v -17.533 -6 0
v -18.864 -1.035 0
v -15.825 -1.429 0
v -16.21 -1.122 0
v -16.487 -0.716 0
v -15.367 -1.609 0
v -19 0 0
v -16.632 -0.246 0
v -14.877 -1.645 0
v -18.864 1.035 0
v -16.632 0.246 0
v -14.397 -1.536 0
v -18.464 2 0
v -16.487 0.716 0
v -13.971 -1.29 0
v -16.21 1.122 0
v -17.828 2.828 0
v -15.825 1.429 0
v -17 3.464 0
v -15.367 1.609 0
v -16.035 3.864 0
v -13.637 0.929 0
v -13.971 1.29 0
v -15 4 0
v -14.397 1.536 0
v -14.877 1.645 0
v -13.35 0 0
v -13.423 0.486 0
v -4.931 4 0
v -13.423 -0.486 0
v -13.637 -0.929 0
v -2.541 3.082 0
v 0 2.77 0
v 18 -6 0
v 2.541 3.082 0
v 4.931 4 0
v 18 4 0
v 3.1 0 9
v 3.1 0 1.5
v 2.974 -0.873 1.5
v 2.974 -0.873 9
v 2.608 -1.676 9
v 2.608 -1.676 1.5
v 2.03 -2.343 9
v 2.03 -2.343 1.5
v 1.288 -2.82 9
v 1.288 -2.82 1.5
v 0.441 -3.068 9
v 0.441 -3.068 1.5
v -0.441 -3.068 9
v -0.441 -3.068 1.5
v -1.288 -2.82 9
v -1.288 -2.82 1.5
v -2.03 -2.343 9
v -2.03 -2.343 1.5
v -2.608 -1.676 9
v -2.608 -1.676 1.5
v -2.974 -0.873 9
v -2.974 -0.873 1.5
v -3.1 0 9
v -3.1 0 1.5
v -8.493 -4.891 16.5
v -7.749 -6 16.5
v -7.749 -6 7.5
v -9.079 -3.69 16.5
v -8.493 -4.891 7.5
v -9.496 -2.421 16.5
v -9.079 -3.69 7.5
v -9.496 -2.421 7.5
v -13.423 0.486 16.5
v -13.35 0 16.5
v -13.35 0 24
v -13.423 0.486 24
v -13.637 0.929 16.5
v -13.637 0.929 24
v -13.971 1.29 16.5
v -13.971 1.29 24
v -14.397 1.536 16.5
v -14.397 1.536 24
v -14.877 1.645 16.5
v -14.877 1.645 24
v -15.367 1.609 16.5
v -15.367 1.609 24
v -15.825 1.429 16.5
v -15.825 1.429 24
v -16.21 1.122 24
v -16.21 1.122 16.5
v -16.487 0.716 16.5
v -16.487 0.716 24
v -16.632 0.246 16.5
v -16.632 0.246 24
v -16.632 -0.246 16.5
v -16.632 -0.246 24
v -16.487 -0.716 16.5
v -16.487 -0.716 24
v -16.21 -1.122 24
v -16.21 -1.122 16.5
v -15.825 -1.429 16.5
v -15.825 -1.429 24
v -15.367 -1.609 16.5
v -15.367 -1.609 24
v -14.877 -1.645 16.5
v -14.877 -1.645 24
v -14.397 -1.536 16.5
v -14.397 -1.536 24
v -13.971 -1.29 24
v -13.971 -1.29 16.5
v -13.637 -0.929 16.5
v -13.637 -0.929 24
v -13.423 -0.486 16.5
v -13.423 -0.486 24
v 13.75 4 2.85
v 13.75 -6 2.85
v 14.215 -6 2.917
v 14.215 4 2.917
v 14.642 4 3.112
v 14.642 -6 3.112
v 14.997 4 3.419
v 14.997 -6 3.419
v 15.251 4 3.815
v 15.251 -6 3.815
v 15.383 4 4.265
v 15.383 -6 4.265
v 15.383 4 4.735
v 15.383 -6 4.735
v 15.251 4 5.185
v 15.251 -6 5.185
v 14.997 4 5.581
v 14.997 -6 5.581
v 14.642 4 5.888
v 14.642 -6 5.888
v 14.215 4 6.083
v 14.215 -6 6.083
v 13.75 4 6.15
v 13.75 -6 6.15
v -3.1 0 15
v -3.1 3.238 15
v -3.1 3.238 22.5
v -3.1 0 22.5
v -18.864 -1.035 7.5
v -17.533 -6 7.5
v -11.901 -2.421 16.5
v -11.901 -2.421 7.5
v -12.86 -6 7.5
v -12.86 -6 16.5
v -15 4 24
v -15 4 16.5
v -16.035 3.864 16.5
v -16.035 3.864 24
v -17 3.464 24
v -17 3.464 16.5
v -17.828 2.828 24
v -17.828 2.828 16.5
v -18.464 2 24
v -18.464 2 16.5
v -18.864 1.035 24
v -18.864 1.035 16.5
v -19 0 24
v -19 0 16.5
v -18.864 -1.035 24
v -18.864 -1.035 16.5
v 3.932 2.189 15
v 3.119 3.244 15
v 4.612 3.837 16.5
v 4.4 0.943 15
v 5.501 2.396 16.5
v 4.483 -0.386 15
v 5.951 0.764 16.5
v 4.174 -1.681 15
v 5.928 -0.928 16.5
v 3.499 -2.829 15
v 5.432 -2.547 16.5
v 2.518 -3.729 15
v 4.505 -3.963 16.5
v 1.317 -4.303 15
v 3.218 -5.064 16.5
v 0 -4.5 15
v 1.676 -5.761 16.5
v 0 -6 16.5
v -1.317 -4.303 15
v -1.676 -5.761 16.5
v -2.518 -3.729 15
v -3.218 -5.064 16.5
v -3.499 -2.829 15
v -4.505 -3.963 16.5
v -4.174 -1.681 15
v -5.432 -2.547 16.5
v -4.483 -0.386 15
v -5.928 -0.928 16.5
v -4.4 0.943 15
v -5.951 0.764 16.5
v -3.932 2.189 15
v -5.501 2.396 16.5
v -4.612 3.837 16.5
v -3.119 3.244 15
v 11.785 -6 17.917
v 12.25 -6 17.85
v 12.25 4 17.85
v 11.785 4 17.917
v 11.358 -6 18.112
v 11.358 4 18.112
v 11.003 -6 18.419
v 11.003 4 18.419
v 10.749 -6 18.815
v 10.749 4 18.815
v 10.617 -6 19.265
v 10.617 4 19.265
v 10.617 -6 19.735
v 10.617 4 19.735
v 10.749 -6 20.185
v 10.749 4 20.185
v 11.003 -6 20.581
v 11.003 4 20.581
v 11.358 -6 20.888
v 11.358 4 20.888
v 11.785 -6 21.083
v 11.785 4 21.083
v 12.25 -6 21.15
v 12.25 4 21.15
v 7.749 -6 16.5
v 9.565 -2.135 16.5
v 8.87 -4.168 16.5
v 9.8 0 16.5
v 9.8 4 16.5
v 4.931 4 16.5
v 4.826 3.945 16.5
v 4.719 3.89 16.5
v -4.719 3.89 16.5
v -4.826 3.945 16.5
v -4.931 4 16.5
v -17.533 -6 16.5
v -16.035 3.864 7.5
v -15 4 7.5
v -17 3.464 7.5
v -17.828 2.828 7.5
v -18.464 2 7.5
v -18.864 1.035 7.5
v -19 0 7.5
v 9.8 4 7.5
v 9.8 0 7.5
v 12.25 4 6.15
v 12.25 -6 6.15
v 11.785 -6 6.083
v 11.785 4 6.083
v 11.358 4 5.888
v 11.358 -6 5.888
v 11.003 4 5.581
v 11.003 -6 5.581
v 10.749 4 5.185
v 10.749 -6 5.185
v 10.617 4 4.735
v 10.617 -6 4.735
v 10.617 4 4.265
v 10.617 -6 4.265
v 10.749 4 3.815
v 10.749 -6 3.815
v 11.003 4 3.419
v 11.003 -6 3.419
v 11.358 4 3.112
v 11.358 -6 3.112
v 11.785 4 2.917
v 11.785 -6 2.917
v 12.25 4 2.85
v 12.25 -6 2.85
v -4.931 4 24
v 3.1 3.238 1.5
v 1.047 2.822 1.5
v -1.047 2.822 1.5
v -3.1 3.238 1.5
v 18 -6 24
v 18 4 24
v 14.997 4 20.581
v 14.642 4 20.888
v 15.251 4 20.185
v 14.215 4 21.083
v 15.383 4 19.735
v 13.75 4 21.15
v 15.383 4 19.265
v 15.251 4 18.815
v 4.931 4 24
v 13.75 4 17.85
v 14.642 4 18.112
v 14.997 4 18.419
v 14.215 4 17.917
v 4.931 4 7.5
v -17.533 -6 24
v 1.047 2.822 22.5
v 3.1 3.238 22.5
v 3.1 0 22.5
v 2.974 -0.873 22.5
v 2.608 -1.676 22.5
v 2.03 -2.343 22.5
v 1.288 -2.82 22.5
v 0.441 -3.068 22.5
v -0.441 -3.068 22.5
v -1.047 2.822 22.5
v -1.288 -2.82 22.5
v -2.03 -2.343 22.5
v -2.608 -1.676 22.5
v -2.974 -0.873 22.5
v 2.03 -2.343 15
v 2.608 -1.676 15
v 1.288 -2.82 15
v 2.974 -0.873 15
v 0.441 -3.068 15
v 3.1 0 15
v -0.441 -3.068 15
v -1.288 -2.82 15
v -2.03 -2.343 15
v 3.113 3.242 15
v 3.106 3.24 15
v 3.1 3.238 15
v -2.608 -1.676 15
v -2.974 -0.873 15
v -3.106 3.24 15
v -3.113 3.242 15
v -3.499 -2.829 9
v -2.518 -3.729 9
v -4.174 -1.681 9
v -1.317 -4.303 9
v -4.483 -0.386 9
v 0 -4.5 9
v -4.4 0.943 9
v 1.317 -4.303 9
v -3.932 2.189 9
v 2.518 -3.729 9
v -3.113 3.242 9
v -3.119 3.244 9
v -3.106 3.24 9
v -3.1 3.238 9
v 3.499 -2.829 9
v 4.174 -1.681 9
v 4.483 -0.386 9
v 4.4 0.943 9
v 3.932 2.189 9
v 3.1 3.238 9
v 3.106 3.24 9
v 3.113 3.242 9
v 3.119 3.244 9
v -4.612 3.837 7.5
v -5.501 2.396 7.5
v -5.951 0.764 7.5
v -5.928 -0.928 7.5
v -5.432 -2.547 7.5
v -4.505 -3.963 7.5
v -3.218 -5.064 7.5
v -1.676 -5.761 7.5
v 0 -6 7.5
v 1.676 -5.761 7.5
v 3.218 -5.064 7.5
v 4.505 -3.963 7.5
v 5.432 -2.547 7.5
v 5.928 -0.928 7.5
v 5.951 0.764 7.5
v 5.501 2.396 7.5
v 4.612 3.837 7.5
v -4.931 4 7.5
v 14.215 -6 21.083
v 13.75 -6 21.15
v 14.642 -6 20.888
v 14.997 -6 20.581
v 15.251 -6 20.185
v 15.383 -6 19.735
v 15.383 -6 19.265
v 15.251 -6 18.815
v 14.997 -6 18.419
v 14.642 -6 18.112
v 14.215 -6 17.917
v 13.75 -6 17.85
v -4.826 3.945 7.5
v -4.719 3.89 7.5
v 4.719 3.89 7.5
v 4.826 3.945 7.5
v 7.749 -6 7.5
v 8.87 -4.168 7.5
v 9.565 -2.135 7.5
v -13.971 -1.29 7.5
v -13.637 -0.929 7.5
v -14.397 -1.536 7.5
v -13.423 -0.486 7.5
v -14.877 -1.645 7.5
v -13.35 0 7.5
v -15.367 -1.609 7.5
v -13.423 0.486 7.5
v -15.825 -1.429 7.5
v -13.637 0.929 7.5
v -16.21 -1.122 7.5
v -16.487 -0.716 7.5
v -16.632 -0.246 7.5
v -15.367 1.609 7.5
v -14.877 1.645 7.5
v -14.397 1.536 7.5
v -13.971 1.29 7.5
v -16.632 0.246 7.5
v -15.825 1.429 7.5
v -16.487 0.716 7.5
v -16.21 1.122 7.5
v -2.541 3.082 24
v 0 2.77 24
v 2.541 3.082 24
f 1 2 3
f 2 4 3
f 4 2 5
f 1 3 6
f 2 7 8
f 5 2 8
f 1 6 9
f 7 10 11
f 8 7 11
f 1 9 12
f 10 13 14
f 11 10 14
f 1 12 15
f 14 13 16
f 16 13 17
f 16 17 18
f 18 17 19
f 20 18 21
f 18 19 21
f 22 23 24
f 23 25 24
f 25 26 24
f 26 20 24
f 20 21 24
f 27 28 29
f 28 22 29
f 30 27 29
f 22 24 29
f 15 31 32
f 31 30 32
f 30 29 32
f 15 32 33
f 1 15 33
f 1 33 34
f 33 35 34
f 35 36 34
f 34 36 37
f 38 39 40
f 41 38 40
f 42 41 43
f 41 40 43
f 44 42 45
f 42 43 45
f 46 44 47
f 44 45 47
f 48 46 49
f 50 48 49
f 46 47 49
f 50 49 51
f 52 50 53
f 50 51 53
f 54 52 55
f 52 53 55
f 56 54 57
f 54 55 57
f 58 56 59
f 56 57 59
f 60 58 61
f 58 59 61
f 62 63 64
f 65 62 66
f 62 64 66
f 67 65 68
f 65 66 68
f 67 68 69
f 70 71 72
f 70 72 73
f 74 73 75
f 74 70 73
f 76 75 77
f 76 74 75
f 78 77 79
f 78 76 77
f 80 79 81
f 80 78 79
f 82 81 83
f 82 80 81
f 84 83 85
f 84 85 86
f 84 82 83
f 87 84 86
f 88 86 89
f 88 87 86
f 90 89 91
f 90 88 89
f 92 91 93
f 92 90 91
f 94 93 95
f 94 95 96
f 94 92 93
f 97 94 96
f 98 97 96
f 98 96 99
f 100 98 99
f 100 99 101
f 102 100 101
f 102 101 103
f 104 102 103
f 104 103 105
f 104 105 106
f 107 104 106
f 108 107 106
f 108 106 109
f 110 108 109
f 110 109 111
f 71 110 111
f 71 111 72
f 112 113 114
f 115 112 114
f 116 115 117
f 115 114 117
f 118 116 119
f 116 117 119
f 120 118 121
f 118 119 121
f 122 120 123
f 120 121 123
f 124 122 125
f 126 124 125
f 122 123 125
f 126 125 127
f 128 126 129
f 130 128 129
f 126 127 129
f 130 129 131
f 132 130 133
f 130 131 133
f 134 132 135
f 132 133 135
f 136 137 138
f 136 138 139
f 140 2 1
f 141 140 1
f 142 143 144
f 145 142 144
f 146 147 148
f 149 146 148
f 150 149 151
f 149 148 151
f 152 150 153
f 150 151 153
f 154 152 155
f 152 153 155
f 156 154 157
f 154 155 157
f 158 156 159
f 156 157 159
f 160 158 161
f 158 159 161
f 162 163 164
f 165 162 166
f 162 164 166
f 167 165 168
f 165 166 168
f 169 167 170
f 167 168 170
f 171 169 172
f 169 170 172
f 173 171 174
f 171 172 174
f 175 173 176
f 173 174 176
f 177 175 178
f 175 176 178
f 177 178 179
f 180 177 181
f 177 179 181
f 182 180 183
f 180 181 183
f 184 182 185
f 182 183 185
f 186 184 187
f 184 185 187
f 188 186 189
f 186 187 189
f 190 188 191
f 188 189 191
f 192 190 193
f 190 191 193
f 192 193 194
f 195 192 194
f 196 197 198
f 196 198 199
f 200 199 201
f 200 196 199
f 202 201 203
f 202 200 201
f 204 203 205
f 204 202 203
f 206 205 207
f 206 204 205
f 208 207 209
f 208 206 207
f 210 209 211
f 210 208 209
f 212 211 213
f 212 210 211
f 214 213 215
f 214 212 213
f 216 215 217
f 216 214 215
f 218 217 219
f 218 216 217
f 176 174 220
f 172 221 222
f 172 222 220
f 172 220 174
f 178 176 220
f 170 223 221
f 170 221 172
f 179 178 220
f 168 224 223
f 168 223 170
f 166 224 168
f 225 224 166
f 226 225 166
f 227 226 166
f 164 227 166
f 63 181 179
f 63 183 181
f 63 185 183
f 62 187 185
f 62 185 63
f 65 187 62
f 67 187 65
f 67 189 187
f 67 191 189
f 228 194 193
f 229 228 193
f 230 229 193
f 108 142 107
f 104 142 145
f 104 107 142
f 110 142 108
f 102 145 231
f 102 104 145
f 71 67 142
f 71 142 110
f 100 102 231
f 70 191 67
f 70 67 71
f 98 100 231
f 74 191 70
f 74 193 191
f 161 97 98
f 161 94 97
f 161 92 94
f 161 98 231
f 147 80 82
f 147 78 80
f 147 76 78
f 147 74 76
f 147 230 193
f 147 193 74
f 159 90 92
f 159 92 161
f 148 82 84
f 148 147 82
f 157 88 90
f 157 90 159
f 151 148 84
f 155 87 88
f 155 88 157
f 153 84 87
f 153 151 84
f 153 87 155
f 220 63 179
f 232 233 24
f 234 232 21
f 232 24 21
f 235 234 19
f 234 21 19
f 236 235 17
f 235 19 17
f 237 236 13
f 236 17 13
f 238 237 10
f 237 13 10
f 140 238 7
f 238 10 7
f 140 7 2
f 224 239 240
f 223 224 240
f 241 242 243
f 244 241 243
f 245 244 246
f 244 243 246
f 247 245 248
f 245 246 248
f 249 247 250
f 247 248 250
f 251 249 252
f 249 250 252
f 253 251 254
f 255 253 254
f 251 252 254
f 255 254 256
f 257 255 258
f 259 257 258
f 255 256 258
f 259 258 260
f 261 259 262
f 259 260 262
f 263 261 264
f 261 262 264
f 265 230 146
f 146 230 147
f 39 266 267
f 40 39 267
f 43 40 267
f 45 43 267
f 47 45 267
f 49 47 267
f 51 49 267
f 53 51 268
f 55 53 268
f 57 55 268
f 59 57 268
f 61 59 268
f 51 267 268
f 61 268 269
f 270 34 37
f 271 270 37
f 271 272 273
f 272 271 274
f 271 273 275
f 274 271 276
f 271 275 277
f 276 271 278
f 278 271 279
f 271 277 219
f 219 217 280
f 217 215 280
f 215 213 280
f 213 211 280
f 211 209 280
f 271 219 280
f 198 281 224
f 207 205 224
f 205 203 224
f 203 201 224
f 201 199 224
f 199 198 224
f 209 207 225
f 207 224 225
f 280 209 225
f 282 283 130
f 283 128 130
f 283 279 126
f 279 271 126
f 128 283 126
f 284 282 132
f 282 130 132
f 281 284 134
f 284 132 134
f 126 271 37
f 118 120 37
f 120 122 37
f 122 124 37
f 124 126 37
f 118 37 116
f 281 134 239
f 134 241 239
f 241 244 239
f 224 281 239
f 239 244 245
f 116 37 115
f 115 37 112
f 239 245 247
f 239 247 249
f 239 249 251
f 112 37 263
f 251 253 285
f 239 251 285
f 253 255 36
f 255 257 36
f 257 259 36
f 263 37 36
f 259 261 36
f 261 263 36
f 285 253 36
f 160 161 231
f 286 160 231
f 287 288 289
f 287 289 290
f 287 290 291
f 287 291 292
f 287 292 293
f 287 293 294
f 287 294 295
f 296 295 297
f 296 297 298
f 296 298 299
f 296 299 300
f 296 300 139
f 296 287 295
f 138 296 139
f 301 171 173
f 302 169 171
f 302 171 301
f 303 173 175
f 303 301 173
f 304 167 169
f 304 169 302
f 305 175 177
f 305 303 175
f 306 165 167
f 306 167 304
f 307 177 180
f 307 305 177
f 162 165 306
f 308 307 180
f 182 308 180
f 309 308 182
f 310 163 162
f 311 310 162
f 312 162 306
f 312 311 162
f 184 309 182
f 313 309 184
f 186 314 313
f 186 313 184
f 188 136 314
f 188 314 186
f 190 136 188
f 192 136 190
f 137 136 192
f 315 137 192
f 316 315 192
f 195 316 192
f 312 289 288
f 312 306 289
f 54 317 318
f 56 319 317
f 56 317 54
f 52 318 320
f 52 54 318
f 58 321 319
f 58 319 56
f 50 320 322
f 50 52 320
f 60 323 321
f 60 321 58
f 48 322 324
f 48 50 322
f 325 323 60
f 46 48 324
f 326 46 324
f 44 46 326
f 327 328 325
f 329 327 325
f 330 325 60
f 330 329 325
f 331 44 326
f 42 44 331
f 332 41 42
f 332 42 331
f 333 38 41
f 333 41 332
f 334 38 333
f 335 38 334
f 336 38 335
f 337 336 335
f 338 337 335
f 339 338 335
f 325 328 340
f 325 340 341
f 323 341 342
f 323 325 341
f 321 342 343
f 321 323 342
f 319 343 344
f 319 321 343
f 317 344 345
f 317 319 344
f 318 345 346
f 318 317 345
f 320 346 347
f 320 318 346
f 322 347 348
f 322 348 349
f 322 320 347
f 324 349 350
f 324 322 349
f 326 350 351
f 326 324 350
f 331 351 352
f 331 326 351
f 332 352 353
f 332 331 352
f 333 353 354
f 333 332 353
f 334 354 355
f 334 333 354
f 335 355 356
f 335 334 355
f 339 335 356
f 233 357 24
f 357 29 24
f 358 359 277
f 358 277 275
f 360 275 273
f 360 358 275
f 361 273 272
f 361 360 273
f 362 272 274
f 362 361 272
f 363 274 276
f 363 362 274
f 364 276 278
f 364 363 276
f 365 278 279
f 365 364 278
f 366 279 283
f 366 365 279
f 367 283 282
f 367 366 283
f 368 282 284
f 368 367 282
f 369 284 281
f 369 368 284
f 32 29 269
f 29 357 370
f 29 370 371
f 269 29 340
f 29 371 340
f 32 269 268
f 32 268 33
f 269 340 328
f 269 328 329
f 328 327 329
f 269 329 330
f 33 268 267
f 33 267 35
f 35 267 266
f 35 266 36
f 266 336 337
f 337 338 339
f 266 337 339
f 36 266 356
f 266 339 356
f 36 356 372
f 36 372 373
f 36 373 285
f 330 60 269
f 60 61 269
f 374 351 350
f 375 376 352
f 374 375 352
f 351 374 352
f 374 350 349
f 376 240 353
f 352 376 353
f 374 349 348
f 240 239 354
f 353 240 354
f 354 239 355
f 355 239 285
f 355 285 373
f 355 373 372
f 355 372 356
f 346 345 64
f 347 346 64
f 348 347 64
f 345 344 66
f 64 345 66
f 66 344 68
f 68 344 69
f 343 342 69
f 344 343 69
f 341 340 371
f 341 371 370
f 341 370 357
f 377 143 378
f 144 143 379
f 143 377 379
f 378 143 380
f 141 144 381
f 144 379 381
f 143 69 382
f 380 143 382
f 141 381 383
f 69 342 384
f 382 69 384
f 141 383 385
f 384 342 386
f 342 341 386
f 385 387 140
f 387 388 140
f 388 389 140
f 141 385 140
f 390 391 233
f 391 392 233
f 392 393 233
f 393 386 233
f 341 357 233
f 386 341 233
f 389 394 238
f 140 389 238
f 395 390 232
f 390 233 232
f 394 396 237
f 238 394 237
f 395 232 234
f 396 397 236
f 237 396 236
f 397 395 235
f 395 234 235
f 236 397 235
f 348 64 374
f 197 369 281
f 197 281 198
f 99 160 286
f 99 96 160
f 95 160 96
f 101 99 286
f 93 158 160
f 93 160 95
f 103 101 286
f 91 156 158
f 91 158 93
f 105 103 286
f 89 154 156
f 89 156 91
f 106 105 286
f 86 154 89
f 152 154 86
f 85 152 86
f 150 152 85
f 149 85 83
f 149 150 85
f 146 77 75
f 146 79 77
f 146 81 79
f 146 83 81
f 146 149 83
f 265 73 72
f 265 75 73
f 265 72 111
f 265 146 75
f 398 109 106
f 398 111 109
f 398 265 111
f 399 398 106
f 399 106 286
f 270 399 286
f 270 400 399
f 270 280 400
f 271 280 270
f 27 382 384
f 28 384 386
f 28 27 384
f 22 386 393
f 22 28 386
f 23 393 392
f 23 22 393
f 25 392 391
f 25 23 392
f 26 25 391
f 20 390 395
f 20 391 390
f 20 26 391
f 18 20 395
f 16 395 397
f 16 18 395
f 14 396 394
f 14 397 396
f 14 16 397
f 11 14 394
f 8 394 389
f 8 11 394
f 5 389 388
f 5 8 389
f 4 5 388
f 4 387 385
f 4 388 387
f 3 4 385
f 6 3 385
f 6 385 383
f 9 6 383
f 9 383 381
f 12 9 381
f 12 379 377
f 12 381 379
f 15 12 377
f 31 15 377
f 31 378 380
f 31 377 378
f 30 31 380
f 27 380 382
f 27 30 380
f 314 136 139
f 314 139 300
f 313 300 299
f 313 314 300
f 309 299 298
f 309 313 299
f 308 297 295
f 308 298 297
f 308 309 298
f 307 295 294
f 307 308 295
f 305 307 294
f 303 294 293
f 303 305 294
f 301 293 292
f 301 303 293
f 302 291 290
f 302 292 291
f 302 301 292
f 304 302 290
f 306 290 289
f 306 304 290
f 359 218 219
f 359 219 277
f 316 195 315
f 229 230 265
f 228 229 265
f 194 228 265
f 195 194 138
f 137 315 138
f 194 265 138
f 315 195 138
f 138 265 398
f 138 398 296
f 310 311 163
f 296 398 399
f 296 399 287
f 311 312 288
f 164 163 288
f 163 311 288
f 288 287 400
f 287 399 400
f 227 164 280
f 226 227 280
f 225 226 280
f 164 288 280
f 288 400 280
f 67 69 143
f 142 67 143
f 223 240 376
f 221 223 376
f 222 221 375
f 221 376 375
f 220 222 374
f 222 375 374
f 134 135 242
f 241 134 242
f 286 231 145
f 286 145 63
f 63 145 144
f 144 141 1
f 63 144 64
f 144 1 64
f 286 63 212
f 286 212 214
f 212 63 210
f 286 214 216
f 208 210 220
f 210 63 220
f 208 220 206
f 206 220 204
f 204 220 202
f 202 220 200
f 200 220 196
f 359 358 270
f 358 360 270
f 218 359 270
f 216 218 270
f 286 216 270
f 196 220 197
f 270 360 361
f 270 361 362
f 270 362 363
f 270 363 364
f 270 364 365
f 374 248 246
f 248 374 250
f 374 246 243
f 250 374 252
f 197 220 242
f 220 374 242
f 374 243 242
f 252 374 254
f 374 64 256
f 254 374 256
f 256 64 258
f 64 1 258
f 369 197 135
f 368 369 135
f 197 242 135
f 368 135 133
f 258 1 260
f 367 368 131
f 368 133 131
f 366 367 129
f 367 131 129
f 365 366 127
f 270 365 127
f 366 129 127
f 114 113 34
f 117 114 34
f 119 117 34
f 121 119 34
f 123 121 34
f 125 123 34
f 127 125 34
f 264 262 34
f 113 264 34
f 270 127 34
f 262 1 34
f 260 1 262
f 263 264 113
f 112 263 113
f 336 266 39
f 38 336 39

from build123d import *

# Parameters (mm, degrees)
SKETCH1_R               = 1.65
BOSS_EXTRUDE1_DEPTH     = 24
CUT_EXTRUDE1_DEPTH      = 4.5
CUT_EXTRUDE1_DEPTH_BACK = 4.5
CUT_EXTRUDE3_DEPTH      = 10.5
CUT_EXTRUDE3_DEPTH_BACK = 10.5
CUT_EXTRUDE2_DEPTH      = 33.202484376
BOSS_EXTRUDE2_DEPTH     = 1.5
BOSS_EXTRUDE3_START     = 1.5
BOSS_EXTRUDE3_DEPTH     = 1.5
CHAMFER1_SIZE           = 1.5
SKETCH7_R               = 10.5
CUT_EXTRUDE4_DEPTH      = 32.192947921


with BuildPart() as part:
    # Sketch1 → Boss-Extrude1 (new body)
    with BuildSketch(Plane.XY):
        with BuildLine():
            Line((-18.863703305, -1.03527618), (-17.533409567, -6))
            Line((-17.533409567, -6), (18, -6))
            Line((18, -6), (18, 4))
            Line((18, 4), (-15, 4))
            ThreePointArc((-15, 4), (-18.173413361, 2.435045716), (-18.863703305, -1.03527618))
        make_face()
        with Locations((-15, 0)):
            Circle(SKETCH1_R, mode=Mode.SUBTRACT)
    extrude(amount=BOSS_EXTRUDE1_DEPTH)

    # Sketch2 → Cut-Extrude1 (cut, two sides: drawn at the far end of the back side and taken through both)
    with BuildSketch(Plane.XY.offset(12).offset(-CUT_EXTRUDE1_DEPTH_BACK)):
        with BuildLine():
            Line((-11.901189968, -2.421210935), (-19.809111658, -31.933976465))
            Line((-19.809111658, -31.933976465), (-19.809111658, 9.8))
            Line((-19.809111658, 9.8), (9.8, 9.8))
            Line((9.8, 9.8), (9.8, 0))
            ThreePointArc((9.8, 0), (1.220098284, -9.723752371), (-9.496195955, -2.421210935))
            Line((-9.496195955, -2.421210935), (-11.901189968, -2.421210935))
        make_face()
    extrude(amount=CUT_EXTRUDE1_DEPTH + CUT_EXTRUDE1_DEPTH_BACK, mode=Mode.SUBTRACT)

    # Sketch4 → Cut-Extrude3 (cut, two sides: drawn at the far end of the back side and taken through both)
    with BuildSketch(Plane.XY.offset(12).offset(-CUT_EXTRUDE3_DEPTH_BACK)):
        with BuildLine():
            Line((-3.1, 0), (-3.1, 6.453034263))
            Line((-3.1, 6.453034263), (3.1, 6.453034263))
            Line((3.1, 6.453034263), (3.1, 0))
            ThreePointArc((3.1, 0), (0, -3.1), (-3.1, 0))
        make_face()
    extrude(amount=CUT_EXTRUDE3_DEPTH + CUT_EXTRUDE3_DEPTH_BACK, mode=Mode.SUBTRACT)

    # Sketch3 → Cut-Extrude2 (cut, through all)
    with BuildSketch(Plane.XZ.offset(6)):
        with BuildLine():
            Line((13.75, 17.85), (12.25, 17.85))
            ThreePointArc((12.25, 17.85), (10.6, 19.5), (12.25, 21.15))
            Line((12.25, 21.15), (13.75, 21.15))
            ThreePointArc((13.75, 21.15), (15.4, 19.5), (13.75, 17.85))
        make_face()
        with BuildLine():
            Line((13.75, 6.15), (12.25, 6.15))
            ThreePointArc((12.25, 6.15), (10.6, 4.5), (12.25, 2.85))
            Line((12.25, 2.85), (13.75, 2.85))
            ThreePointArc((13.75, 2.85), (15.4, 4.5), (13.75, 6.15))
        make_face()
    extrude(amount=-CUT_EXTRUDE2_DEPTH, mode=Mode.SUBTRACT)

    # Sketch5 → Boss-Extrude2 (add)
    with BuildSketch(Plane.XY.offset(7.5)):
        with BuildLine():
            Line((-3.1, 0), (-3.1, 3.261901286))
            ThreePointArc((-3.1, 3.261901286), (0, -4.5), (3.1, 3.261901286))
            Line((3.1, 3.261901286), (3.1, 0))
            ThreePointArc((3.1, 0), (0, -3.1), (-3.1, 0))
        make_face()
    extrude(amount=BOSS_EXTRUDE2_DEPTH)

    # Sketch6 → Boss-Extrude3 (add)
    with BuildSketch(Plane(origin=(0, 0, 16.5), x_dir=(-1, 0, 0), z_dir=(0, 0, -1)).offset(BOSS_EXTRUDE3_START)):
        with BuildLine():
            Line((-3.1, 0), (-3.1, 3.261901286))
            ThreePointArc((-3.1, 3.261901286), (0, -4.5), (3.1, 3.261901286))
            Line((3.1, 3.261901286), (3.1, 0))
            ThreePointArc((3.1, 0), (0, -3.1), (-3.1, 0))
        make_face()
    extrude(amount=-BOSS_EXTRUDE3_DEPTH)

    # Chamfer1
    chamfer1_edges = [part.edges().sort_by_distance(p)[0] for p in [
        (0, -4.5, 7.5),
        (0, -4.5, 16.5),
    ]]
    chamfer(chamfer1_edges, length=CHAMFER1_SIZE - 0.0001)  # a hair under: the kernel refuses the full size

    # Sketch7 → Cut-Extrude4 (cut, through all)
    with BuildSketch(Plane.XY.offset(24)):
        with Locations((0, 13.27)):
            Circle(SKETCH7_R)
    extrude(amount=-CUT_EXTRUDE4_DEPTH, mode=Mode.SUBTRACT)


solid = part.part
